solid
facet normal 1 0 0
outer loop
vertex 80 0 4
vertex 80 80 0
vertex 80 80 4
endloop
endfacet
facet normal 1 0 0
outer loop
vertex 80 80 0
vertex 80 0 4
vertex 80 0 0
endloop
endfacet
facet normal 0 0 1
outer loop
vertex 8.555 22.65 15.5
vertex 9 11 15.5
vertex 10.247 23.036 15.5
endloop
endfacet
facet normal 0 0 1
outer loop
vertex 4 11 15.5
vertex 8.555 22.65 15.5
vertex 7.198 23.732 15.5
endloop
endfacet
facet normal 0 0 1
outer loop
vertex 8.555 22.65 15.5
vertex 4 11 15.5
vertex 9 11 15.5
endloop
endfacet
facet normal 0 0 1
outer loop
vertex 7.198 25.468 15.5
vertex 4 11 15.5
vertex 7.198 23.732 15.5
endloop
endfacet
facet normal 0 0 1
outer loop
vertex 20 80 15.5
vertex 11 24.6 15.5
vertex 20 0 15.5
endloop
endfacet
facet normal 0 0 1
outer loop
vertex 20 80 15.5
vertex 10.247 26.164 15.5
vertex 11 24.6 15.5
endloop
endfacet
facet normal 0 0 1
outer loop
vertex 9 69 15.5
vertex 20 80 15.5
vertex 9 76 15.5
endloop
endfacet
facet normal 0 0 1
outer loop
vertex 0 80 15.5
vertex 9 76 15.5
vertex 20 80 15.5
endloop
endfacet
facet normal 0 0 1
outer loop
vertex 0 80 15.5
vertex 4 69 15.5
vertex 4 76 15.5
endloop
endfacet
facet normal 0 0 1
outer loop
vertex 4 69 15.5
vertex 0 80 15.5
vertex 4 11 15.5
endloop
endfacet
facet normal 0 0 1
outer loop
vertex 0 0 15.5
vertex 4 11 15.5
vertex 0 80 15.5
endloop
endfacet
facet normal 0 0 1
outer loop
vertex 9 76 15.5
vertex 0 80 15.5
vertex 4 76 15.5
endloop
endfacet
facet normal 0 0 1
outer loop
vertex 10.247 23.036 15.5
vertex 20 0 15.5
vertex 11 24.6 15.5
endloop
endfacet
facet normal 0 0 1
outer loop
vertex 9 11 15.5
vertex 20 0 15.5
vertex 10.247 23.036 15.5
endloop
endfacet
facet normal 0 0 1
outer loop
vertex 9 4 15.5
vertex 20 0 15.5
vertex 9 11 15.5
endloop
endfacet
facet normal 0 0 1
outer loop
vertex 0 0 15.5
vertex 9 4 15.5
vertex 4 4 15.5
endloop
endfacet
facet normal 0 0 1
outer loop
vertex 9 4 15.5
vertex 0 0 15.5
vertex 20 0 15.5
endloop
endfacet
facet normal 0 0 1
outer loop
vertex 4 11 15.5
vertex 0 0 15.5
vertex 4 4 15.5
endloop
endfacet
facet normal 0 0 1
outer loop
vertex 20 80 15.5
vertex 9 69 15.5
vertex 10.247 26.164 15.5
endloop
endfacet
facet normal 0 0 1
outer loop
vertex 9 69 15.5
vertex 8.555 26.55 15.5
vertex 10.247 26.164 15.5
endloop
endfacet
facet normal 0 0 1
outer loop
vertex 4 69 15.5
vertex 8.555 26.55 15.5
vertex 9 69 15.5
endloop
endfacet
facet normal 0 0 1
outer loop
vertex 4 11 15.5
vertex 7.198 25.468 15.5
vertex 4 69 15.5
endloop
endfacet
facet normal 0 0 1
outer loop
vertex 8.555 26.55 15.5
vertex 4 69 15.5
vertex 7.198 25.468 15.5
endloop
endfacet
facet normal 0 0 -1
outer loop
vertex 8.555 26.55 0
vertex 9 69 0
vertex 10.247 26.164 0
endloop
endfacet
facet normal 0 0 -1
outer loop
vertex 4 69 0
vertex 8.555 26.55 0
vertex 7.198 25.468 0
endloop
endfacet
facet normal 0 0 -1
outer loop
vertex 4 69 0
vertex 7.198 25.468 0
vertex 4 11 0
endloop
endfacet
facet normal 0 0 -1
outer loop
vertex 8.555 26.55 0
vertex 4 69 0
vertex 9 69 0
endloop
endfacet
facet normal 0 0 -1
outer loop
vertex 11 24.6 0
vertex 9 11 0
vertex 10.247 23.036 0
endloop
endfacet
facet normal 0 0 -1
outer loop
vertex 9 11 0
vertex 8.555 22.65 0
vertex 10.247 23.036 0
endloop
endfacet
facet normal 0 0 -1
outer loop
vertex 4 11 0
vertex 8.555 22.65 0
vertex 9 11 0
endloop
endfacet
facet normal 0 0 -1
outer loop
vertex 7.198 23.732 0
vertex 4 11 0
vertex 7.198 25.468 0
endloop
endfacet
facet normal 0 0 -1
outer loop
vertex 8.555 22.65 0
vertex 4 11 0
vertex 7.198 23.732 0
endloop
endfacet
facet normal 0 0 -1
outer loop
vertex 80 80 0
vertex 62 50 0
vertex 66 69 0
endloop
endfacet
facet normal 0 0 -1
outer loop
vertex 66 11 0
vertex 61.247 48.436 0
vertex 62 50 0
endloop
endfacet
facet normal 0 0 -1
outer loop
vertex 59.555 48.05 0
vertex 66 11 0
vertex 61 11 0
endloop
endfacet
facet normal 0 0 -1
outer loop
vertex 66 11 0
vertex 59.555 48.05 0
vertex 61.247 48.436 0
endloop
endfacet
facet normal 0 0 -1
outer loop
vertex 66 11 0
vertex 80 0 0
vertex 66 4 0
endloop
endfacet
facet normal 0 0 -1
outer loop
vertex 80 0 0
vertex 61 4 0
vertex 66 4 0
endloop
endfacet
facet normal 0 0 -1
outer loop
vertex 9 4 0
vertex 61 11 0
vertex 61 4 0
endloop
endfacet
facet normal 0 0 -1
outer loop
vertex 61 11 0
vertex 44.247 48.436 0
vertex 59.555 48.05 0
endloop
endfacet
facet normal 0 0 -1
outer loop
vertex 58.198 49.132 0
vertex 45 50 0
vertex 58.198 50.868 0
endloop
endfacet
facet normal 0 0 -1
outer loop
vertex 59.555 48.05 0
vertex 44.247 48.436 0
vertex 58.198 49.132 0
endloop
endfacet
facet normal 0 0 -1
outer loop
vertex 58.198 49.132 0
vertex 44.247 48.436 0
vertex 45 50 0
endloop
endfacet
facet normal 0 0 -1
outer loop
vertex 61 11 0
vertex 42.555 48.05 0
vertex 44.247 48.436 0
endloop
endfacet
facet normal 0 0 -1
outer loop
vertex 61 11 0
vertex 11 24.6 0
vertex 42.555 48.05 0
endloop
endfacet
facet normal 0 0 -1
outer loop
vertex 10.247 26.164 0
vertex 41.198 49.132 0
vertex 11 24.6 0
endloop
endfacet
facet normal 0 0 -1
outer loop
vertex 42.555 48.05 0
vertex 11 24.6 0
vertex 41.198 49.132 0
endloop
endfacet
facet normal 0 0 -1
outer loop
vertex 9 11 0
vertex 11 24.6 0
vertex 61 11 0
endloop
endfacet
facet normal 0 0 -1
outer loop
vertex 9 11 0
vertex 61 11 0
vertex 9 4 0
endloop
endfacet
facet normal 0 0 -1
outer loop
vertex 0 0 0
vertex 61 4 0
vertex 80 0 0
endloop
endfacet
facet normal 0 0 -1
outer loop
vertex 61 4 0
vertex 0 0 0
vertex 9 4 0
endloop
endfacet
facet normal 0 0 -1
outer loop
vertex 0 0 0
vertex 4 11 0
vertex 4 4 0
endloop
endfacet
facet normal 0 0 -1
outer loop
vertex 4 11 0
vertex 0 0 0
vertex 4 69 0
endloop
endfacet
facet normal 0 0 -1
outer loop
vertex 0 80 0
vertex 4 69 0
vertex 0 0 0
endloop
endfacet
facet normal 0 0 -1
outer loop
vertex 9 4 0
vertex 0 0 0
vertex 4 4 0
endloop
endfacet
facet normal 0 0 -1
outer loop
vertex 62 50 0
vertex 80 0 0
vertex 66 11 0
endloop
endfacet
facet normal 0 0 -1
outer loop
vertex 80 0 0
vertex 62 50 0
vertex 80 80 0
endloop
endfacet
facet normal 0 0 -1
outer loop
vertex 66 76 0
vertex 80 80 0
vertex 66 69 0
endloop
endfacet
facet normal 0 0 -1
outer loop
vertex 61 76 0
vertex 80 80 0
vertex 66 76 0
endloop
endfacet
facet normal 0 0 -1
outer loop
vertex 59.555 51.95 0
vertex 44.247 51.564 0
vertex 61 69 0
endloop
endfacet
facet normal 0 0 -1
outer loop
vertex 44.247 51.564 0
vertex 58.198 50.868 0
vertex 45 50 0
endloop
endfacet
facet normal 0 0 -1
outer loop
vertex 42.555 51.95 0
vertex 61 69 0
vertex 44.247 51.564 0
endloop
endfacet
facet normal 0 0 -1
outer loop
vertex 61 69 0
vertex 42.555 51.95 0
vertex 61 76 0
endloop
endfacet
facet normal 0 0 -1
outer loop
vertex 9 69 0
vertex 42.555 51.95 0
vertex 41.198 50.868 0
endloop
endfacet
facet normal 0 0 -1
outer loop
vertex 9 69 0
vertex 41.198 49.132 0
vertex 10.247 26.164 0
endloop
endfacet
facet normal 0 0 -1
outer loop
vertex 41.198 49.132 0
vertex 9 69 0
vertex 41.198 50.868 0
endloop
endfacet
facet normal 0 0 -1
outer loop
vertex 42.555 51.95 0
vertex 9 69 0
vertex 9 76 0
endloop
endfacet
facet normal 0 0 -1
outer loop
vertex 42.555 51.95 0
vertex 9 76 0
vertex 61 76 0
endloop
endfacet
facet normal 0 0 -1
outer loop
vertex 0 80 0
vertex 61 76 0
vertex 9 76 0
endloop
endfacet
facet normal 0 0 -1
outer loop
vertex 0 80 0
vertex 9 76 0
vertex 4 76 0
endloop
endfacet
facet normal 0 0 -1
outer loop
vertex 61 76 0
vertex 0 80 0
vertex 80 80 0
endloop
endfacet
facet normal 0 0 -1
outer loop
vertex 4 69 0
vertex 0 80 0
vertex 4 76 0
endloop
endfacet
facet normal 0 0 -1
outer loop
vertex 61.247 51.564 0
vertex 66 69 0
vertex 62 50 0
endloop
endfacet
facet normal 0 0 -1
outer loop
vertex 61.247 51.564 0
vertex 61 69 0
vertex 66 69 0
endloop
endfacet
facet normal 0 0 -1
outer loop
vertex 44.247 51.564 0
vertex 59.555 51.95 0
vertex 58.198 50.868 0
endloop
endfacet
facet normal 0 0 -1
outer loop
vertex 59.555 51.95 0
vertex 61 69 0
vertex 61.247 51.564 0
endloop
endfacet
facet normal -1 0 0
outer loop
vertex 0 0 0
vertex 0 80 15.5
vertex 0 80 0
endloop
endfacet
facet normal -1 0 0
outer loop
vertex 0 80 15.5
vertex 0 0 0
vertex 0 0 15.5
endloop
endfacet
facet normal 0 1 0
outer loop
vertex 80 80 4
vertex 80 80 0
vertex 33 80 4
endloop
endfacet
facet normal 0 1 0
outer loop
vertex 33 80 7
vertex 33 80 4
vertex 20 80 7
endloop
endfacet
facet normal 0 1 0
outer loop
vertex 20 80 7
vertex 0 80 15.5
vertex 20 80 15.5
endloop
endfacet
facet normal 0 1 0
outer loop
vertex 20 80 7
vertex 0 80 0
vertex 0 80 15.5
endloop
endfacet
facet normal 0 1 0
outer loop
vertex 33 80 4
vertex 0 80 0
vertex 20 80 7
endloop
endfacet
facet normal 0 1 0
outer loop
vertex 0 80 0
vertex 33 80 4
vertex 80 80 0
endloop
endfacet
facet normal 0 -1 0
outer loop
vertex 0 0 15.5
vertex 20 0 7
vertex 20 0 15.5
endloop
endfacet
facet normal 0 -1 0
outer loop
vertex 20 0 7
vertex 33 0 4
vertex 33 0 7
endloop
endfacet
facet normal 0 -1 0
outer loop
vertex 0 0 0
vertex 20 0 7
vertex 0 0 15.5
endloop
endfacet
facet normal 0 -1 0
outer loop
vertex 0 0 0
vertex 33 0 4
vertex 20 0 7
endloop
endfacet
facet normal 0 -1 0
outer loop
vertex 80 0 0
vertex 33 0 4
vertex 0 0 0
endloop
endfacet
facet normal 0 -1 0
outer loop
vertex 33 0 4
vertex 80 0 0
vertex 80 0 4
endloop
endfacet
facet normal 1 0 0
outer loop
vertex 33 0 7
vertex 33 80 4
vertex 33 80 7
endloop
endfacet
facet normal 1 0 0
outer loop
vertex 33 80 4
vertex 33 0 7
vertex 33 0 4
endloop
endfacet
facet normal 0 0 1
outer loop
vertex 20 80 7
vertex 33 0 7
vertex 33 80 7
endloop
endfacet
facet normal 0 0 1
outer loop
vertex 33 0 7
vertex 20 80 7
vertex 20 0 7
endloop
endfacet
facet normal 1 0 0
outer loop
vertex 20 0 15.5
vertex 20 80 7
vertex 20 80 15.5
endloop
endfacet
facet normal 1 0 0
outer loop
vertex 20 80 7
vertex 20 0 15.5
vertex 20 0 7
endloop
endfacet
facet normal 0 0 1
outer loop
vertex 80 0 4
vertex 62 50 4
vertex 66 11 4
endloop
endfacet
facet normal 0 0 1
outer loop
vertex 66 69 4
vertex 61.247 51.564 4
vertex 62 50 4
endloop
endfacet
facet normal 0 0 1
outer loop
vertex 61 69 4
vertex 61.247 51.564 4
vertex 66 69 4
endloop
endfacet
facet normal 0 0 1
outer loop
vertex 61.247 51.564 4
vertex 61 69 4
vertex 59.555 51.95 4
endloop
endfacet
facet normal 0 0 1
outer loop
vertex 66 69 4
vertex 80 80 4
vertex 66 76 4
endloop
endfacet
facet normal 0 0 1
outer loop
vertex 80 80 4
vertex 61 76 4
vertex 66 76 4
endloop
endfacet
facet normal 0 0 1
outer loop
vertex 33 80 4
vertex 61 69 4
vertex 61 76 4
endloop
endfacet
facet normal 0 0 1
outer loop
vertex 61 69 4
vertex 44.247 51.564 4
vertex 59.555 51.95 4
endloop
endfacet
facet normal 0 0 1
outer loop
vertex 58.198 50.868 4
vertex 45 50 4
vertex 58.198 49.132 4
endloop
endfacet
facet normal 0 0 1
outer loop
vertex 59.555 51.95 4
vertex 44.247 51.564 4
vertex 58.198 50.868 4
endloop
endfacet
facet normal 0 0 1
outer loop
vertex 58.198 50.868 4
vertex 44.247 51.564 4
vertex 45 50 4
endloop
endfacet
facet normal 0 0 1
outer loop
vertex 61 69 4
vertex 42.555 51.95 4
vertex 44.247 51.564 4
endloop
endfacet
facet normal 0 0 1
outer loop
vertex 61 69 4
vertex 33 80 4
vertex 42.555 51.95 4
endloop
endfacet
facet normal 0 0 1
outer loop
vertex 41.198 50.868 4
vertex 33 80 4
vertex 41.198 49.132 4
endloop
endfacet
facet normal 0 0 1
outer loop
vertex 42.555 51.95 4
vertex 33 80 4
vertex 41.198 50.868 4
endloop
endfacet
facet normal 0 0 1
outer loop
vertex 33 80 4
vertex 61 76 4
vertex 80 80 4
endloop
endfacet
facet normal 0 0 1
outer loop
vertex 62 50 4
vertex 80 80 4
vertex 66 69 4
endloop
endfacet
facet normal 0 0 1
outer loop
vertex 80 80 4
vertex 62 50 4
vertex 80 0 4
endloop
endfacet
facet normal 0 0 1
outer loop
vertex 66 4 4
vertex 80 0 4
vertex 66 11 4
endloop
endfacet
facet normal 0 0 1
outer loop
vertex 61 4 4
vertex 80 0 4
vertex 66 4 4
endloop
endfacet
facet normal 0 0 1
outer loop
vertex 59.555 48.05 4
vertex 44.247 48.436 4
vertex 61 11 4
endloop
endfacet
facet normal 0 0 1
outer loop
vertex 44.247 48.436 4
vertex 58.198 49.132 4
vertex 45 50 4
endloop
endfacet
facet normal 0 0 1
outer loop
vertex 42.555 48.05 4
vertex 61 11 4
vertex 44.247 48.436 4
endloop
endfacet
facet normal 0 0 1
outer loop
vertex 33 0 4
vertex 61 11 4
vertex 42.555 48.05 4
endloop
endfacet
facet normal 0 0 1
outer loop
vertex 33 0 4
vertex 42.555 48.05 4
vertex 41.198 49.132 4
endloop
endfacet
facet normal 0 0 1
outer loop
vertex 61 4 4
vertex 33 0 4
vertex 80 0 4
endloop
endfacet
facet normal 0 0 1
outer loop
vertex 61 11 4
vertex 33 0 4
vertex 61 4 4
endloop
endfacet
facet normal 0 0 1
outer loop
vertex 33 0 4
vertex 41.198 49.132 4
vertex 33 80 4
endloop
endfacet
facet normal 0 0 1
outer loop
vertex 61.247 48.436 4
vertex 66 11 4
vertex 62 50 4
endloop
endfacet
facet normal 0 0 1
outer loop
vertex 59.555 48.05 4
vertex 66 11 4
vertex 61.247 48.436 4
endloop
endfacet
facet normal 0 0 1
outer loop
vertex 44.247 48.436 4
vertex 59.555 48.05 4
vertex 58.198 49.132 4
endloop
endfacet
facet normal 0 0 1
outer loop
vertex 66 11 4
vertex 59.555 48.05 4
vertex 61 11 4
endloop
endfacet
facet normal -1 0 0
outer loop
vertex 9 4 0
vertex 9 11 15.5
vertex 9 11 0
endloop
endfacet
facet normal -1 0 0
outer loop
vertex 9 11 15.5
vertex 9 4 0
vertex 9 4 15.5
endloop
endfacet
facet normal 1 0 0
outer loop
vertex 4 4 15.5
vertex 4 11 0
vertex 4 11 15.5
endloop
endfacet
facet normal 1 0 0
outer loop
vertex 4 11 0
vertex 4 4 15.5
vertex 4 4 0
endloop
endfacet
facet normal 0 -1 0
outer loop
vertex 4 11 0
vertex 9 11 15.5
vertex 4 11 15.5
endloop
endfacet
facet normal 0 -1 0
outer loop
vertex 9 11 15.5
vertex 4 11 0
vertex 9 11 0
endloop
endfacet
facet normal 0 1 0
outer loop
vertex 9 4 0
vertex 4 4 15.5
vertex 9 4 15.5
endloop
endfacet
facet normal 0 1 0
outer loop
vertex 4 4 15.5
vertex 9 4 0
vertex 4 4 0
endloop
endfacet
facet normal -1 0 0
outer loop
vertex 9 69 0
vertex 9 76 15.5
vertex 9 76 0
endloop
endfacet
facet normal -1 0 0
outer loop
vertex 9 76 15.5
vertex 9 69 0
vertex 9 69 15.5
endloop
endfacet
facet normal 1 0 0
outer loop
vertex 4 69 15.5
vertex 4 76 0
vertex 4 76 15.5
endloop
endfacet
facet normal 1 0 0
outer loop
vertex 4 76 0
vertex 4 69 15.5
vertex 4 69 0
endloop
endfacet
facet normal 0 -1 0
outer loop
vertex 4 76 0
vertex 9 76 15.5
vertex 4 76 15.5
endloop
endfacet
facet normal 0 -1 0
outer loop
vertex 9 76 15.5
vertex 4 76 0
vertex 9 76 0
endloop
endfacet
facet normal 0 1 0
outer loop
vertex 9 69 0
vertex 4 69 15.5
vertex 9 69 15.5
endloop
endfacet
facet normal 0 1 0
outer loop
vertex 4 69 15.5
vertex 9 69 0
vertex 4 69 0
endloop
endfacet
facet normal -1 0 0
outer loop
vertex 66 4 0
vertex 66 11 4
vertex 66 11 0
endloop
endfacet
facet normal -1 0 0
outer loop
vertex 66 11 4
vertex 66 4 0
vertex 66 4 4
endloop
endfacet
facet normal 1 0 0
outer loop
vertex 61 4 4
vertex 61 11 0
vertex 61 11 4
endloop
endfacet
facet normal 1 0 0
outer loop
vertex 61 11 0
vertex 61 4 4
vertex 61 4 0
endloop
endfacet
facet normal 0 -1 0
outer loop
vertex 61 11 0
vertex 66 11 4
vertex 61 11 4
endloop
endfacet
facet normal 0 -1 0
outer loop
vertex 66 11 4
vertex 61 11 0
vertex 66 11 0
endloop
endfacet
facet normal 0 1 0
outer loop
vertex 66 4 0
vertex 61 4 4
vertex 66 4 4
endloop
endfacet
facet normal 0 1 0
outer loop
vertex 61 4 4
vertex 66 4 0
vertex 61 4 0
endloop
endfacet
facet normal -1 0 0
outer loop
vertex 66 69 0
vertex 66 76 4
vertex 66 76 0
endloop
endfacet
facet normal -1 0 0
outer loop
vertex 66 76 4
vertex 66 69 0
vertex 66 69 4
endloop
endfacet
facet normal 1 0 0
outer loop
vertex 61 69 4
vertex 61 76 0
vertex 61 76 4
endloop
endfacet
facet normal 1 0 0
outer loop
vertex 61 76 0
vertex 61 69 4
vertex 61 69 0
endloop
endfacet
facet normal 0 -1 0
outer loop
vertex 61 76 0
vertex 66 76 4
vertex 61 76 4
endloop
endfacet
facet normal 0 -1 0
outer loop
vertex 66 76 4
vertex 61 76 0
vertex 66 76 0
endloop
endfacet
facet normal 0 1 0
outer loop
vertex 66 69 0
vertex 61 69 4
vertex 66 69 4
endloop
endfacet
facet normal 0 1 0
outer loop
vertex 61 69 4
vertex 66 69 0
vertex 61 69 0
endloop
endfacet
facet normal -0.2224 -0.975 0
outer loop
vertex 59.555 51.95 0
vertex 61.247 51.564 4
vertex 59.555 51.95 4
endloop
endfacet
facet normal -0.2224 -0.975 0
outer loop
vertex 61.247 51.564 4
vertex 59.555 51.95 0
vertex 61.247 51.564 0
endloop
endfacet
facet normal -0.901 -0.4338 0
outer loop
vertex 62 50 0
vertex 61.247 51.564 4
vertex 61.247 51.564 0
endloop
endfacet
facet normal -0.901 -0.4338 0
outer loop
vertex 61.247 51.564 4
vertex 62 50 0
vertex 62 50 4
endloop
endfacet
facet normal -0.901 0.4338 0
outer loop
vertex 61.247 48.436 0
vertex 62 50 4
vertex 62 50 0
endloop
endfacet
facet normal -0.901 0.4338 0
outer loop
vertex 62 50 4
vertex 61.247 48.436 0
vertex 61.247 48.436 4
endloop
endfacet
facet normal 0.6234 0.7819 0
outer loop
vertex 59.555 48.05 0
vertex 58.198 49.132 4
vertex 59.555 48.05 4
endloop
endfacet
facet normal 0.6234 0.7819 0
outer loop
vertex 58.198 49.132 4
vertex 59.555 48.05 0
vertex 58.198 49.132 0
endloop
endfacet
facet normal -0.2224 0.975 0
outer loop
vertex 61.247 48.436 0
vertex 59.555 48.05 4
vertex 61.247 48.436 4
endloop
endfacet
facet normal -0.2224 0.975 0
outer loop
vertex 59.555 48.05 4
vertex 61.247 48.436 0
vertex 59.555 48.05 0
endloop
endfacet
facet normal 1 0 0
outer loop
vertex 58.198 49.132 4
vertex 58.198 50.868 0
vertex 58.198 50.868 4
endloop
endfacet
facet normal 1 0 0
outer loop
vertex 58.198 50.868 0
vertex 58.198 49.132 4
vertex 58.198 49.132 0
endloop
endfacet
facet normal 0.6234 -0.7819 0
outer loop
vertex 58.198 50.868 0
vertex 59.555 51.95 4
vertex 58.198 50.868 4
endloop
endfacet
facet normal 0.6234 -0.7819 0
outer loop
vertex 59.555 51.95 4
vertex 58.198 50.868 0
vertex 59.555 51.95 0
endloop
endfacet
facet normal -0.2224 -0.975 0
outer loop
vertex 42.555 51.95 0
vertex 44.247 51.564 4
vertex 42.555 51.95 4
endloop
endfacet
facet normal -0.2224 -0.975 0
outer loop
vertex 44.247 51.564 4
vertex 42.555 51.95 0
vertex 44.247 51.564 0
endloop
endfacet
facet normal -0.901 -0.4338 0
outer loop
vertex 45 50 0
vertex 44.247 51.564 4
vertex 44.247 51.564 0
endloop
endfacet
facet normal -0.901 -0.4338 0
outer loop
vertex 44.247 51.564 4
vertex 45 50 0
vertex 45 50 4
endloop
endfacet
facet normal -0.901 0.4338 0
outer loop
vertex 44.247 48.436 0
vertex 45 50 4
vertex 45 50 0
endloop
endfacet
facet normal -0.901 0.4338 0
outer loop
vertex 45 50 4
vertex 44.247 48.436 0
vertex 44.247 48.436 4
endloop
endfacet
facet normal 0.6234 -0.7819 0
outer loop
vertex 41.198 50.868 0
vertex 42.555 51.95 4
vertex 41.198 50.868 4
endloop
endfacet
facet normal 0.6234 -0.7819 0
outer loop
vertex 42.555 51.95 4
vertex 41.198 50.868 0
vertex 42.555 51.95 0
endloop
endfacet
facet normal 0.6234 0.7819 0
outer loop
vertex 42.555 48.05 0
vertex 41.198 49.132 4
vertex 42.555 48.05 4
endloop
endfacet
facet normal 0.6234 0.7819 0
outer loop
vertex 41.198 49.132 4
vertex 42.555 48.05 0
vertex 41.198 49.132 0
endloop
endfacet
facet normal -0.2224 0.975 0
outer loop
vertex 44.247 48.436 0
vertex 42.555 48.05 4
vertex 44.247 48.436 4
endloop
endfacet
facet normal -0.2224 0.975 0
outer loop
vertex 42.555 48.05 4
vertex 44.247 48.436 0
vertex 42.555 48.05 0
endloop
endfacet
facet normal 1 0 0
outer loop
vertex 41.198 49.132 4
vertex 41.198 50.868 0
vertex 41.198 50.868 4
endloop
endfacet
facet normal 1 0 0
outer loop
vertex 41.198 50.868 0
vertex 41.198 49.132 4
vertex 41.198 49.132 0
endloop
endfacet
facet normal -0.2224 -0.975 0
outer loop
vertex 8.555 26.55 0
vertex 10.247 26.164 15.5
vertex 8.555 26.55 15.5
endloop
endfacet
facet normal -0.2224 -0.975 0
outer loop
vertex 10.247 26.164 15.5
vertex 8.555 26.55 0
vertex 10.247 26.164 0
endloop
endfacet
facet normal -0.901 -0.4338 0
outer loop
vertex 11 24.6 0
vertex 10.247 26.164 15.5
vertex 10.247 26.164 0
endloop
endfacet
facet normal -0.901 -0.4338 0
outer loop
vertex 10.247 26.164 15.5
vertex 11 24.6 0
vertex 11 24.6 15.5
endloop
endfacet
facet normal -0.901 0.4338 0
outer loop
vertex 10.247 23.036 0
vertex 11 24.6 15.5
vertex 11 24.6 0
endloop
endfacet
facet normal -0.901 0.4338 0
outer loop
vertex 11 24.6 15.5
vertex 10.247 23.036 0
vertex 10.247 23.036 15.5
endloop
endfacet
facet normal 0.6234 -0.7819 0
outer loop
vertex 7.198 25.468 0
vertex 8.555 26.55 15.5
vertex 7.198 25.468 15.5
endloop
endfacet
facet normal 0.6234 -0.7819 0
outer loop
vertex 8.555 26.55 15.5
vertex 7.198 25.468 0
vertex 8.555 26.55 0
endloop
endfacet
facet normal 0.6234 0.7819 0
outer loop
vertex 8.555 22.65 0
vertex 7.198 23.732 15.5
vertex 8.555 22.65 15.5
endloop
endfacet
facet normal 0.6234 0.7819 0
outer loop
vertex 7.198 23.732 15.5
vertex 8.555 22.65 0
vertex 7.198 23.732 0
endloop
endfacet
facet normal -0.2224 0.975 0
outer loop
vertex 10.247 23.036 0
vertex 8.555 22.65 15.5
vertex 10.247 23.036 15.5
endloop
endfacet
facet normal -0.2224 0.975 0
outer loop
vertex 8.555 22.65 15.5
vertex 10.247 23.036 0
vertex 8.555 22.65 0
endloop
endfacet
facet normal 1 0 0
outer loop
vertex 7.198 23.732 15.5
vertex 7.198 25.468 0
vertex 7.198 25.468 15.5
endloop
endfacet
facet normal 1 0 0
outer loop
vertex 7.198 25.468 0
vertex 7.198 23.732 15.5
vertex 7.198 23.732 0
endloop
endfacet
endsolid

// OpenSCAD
module motor_support() {
   difference() {
	// 3-level structure:
	color("yellow") cube([80, 80, 15.5], center=false);
	color("red") translate([20, 0, 7]) cube([13, 80, 8.5], center=false);
	translate([33, 0, 4]) cube([47, 80, 11.5], center=false);

	// holes:
	color("blue") translate([4, 4, 0]) cube([5, 7, 15.5], center=false);
	color("blue") translate([4, 69, 0]) cube([5, 7, 15.5], center=false);
	color("blue") translate([61, 4, 0]) cube([5, 7, 4], center=false);
	color("blue") translate([61, 69, 0]) cube([5, 7, 4], center=false);

	color("black") translate([60, 50, 0]) cylinder(h=4, r=2);
	color("black") translate([43, 50, 0]) cylinder(h=4, r=2);
	color("black") translate([9, 24.6, 0]) cylinder(h=15.5, r=2);
   }
}

motor_support();
